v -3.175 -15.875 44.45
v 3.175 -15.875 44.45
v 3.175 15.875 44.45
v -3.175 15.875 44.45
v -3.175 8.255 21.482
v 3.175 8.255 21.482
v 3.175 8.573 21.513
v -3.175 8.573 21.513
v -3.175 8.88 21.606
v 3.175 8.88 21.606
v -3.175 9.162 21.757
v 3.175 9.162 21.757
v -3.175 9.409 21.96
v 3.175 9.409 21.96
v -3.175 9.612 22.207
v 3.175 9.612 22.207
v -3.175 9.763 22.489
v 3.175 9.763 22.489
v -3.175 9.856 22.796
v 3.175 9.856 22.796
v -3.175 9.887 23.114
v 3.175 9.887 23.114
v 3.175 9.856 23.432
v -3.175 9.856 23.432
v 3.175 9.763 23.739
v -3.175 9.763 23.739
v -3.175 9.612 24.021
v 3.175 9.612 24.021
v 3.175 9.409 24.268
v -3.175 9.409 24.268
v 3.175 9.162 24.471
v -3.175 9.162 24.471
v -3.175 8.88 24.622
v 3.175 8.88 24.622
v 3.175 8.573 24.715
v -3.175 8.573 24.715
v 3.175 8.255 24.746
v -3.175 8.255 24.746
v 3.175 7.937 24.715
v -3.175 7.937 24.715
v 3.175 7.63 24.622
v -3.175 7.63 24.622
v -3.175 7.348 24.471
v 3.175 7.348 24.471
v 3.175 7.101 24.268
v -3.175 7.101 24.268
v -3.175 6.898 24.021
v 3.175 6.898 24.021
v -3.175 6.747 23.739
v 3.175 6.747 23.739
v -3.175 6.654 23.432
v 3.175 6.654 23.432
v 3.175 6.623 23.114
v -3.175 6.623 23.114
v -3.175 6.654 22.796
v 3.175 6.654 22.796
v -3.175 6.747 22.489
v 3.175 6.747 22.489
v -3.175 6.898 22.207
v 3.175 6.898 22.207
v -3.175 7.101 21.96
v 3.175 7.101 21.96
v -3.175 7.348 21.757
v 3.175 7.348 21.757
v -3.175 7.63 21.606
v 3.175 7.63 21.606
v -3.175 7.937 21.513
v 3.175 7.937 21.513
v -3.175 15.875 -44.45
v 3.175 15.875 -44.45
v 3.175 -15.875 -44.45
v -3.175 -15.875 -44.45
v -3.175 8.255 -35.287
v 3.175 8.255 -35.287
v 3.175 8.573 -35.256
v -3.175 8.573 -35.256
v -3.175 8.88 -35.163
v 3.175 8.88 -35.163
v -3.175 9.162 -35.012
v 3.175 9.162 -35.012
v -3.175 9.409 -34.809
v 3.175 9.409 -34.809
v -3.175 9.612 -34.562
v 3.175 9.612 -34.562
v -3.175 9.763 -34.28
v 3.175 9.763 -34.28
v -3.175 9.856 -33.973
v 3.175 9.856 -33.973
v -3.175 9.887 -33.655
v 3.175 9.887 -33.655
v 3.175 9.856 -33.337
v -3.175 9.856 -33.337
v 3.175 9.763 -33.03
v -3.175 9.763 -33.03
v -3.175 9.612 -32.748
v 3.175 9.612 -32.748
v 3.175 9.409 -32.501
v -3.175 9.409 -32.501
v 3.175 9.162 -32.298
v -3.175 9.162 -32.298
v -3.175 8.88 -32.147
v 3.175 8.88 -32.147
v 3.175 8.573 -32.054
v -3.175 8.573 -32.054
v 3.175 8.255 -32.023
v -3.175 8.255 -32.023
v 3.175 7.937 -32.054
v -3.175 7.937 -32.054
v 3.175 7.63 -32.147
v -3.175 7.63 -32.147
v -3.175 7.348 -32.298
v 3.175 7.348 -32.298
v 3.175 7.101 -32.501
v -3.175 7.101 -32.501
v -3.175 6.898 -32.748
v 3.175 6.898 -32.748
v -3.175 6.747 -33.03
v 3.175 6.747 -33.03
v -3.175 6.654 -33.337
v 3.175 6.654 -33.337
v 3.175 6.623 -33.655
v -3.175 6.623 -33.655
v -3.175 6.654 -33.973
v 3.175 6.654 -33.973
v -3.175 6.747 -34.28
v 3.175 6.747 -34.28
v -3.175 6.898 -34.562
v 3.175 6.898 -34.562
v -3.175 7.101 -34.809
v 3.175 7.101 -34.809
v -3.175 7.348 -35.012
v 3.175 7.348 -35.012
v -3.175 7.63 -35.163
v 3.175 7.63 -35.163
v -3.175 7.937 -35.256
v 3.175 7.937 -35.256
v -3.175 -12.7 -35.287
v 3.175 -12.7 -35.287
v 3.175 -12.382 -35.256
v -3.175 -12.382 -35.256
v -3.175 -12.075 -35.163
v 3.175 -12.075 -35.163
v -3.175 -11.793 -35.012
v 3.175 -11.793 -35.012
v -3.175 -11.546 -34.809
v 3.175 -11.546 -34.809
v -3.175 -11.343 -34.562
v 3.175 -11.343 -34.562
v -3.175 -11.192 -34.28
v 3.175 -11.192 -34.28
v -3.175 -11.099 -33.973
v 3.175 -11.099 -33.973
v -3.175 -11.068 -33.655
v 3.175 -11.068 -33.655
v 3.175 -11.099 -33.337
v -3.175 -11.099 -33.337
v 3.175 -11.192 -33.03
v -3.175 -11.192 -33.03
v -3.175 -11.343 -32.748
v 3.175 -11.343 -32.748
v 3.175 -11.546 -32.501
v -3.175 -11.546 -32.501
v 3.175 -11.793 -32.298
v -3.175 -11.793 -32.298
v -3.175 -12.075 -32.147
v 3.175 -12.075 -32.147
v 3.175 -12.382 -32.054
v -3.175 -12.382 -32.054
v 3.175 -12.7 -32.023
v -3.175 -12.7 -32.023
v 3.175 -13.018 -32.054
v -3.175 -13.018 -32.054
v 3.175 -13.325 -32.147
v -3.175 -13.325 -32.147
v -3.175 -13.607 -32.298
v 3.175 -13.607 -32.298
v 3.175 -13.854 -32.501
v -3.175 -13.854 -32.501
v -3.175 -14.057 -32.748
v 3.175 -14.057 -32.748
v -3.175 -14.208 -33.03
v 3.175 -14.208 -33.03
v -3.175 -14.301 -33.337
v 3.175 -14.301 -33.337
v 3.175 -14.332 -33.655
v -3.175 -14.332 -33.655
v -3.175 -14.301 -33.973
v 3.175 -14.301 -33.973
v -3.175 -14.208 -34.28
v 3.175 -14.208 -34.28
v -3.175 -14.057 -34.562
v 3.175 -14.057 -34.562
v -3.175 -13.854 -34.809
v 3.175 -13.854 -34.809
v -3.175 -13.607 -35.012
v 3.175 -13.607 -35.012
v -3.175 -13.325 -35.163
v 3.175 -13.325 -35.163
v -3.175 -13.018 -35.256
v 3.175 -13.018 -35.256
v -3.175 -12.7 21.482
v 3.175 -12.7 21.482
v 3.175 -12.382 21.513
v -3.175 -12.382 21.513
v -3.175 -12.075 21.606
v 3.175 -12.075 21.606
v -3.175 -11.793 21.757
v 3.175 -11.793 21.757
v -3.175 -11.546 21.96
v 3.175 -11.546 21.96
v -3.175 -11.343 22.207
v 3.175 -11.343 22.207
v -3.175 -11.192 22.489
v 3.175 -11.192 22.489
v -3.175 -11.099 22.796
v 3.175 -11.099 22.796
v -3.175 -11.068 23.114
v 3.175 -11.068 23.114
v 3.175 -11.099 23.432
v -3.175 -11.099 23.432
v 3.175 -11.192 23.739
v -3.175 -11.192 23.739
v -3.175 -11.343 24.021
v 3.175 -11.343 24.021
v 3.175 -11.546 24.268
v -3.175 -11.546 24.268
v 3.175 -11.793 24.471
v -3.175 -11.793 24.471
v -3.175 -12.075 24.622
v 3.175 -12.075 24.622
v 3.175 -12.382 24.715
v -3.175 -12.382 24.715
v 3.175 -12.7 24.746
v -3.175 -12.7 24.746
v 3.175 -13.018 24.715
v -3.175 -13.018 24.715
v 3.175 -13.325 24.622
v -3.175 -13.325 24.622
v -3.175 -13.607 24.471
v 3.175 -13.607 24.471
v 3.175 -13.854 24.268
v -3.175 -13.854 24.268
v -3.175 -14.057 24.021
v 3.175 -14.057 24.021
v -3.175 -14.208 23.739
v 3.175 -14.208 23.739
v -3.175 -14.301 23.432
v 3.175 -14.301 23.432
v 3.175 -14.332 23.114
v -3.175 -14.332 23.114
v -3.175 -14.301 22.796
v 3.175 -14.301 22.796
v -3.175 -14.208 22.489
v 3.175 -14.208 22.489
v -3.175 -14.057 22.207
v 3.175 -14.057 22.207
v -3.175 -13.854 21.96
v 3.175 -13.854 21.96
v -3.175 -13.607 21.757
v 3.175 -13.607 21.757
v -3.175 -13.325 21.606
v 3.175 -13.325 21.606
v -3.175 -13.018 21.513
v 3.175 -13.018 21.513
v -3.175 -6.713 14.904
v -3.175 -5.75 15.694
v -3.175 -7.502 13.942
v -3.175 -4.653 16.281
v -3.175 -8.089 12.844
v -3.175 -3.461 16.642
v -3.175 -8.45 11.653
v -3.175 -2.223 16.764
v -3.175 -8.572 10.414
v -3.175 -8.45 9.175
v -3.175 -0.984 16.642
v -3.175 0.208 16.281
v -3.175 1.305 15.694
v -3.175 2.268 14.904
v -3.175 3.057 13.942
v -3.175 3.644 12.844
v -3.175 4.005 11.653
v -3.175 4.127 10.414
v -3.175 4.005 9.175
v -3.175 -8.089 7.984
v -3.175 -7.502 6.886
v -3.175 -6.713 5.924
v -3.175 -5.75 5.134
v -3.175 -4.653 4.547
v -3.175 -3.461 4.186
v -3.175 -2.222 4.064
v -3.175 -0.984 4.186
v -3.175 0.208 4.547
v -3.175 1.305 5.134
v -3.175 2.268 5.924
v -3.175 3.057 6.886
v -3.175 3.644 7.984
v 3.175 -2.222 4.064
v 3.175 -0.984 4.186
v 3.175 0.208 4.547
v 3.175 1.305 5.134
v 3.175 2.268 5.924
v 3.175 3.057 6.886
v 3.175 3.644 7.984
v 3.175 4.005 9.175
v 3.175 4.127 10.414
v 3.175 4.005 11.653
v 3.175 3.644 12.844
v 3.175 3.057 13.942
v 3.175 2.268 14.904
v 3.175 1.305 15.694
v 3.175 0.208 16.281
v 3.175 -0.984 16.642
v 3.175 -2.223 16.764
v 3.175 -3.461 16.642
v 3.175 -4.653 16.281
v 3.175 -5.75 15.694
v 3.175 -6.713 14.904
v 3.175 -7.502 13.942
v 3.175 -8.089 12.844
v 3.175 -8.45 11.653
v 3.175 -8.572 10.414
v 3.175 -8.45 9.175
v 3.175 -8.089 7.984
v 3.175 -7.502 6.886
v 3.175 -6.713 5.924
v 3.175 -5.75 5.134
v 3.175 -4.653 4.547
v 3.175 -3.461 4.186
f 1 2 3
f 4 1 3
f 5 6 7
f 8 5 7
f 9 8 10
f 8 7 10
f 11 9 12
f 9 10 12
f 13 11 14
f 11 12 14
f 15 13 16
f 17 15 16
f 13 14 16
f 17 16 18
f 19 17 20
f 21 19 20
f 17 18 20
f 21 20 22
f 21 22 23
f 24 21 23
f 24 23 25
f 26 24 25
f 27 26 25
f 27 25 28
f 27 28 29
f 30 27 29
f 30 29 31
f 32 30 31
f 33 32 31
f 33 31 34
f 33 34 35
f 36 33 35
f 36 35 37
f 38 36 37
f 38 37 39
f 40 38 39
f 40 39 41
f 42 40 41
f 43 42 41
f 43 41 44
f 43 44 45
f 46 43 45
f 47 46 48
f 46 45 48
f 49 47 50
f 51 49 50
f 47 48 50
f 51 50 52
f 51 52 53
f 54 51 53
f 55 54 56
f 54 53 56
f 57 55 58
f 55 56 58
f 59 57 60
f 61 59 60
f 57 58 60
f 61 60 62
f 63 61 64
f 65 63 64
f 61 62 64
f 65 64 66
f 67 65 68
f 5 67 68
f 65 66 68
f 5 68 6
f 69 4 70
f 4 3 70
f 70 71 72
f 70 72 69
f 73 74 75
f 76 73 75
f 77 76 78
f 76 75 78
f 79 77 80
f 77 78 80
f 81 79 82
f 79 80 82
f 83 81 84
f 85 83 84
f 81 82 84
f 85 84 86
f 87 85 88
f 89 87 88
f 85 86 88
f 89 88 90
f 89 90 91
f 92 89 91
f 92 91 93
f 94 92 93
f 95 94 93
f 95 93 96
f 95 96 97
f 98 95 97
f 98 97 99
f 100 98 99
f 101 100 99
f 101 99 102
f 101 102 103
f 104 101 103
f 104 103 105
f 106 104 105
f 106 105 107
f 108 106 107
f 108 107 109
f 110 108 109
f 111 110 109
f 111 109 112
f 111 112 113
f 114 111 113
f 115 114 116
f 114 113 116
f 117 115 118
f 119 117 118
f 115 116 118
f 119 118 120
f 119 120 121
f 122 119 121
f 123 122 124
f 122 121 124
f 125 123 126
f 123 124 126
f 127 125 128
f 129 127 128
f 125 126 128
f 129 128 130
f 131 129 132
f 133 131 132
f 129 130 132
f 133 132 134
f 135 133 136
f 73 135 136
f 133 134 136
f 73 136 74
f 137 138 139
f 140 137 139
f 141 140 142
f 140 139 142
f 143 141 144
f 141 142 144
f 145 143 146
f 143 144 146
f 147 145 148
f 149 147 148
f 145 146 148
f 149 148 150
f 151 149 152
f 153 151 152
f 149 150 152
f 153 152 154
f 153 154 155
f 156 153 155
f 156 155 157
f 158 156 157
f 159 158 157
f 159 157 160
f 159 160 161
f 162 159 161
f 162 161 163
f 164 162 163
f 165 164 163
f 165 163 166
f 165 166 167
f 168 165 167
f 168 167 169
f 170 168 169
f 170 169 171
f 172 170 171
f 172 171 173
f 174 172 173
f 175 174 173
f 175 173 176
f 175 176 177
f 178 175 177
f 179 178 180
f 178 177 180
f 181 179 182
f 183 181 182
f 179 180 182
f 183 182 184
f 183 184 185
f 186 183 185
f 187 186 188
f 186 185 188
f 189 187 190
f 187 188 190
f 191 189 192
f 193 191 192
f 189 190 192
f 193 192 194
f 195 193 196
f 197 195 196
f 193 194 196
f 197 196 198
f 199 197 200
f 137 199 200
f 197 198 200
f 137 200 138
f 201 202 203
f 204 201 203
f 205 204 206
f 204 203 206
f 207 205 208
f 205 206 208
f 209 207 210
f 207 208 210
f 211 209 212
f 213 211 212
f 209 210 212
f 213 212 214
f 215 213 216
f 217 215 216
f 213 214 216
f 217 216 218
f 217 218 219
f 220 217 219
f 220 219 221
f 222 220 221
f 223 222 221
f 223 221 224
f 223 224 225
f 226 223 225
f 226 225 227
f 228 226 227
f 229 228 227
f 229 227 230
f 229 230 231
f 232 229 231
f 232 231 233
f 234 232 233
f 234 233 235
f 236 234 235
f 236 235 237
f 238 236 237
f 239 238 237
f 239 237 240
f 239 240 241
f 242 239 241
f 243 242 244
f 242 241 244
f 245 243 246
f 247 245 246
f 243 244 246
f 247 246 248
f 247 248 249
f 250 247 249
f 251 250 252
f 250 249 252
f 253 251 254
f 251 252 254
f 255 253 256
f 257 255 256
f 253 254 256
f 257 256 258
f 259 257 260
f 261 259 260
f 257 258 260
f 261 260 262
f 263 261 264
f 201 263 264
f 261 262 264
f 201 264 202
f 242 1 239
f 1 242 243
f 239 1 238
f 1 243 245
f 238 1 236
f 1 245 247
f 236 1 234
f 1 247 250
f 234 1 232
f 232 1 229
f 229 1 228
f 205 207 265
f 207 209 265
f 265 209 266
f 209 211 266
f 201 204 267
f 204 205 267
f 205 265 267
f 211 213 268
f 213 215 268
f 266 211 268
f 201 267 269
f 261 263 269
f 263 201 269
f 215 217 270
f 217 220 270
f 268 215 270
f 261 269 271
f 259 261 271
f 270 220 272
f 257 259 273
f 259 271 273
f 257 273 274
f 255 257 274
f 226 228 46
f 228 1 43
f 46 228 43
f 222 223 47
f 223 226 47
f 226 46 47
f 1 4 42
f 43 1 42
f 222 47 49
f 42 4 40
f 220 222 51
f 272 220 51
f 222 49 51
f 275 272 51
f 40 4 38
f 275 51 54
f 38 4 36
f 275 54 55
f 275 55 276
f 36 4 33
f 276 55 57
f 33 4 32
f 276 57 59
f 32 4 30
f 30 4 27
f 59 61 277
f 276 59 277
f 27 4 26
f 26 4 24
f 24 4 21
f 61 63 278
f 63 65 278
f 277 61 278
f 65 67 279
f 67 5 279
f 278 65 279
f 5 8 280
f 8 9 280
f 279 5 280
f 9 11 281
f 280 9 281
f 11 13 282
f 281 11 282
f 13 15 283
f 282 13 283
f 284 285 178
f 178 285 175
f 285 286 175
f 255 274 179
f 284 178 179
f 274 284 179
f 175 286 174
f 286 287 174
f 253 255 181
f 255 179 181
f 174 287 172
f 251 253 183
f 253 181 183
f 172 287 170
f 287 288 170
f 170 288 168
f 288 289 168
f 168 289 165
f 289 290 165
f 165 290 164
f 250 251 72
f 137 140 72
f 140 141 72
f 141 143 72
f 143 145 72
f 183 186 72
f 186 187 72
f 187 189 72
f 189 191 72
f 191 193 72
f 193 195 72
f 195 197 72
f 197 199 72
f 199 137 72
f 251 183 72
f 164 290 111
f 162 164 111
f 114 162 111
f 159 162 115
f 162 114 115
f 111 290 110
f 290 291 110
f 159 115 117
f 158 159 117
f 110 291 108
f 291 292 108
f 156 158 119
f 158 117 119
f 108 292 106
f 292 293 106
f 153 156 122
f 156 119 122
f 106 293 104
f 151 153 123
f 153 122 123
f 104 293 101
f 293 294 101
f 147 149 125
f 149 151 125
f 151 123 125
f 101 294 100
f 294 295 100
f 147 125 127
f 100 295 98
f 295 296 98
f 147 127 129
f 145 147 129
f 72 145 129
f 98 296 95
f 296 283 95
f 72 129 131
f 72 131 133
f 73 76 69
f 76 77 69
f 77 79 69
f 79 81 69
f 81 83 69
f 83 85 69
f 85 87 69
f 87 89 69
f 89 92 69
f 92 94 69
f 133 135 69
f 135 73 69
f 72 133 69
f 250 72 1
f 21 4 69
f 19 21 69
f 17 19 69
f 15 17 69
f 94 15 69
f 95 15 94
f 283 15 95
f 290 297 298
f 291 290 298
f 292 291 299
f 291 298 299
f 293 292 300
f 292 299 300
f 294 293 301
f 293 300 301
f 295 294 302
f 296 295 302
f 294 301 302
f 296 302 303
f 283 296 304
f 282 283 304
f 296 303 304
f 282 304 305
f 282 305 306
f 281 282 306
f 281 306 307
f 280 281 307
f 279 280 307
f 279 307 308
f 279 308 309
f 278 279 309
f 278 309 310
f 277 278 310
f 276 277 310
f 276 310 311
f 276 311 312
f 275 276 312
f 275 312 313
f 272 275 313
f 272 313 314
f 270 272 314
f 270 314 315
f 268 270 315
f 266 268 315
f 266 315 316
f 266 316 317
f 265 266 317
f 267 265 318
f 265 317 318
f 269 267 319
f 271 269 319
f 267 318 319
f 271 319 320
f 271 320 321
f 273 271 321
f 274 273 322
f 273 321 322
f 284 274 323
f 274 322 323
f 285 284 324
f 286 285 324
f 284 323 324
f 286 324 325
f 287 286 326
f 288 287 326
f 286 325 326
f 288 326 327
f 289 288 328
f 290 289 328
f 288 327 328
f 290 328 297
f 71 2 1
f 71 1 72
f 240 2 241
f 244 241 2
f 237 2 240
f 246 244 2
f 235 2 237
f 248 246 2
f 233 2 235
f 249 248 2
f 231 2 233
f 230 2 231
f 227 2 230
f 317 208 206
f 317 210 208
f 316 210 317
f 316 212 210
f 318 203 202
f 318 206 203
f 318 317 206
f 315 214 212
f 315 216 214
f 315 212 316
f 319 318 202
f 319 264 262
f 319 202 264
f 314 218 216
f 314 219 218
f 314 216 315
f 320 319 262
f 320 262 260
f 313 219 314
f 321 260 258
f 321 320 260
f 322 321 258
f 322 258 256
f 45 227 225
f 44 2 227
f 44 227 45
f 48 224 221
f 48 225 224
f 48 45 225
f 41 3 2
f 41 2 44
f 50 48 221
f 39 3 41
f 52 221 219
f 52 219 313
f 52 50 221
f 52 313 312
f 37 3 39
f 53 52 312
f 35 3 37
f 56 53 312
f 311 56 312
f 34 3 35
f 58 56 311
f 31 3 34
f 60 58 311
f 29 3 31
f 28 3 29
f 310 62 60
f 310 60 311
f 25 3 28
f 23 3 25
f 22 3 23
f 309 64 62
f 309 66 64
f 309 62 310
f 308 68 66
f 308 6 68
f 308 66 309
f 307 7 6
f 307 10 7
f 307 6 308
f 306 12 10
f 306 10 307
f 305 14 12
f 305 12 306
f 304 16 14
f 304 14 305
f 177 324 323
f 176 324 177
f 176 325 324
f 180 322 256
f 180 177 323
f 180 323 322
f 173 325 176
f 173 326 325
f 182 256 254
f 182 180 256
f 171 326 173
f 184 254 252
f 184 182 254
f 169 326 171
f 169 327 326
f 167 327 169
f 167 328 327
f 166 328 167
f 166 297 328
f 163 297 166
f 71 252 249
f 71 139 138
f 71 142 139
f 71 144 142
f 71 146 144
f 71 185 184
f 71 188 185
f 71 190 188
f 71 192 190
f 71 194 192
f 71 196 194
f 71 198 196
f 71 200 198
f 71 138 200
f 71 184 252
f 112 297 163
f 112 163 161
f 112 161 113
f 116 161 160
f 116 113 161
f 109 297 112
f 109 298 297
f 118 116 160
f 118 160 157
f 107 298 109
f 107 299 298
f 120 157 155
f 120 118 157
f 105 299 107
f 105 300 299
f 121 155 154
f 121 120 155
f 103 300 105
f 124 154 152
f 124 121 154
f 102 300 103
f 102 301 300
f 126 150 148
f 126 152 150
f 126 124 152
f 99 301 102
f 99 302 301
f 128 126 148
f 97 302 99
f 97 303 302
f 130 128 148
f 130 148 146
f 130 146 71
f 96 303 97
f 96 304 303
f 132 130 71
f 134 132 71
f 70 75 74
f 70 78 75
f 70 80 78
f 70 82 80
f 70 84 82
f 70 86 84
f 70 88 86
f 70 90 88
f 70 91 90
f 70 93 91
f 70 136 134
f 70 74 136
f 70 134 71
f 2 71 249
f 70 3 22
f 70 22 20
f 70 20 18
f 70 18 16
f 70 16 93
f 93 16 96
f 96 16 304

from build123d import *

# Parameters (mm, degrees)
SKETCH1_W           = 88.9
SKETCH1_H           = 31.75
BOSS_EXTRUDE1_DEPTH = 3.175
CUT_EXTRUDE1_REACH  = 49.625
SKETCH2_R           = 1.63195
SKETCH2_R_2         = 6.35


with BuildPart() as part:
    # Sketch1 → Boss-Extrude1 (new, symmetric)
    with BuildSketch(Plane(origin=(0, 0, 0), x_dir=(0, 0, -1), z_dir=(1, 0, 0))):
        Rectangle(SKETCH1_W, SKETCH1_H)
    extrude(amount=BOSS_EXTRUDE1_DEPTH, both=True)

    # Sketch2 → Cut-Extrude1 (cut, up to next)
    with BuildSketch(Plane(origin=(3.175, 0, 0), x_dir=(0, 0, -1), z_dir=(1, 0, 0)), mode=Mode.PRIVATE) as cut_extrude1_sk1:
        with Locations((-23.114, 8.255)):
            Circle(SKETCH2_R)
    cut_extrude1_tool1 = extrude(cut_extrude1_sk1.sketch, amount=-CUT_EXTRUDE1_REACH, mode=Mode.PRIVATE) & part.part
    # Sketch2 → Cut-Extrude1 (cut, up to next)
    with BuildSketch(Plane(origin=(3.175, 0, 0), x_dir=(0, 0, -1), z_dir=(1, 0, 0)), mode=Mode.PRIVATE) as cut_extrude1_sk2:
        with Locations((-23.114, -12.7)):
            Circle(SKETCH2_R)
    cut_extrude1_tool2 = extrude(cut_extrude1_sk2.sketch, amount=-CUT_EXTRUDE1_REACH, mode=Mode.PRIVATE) & part.part
    # Sketch2 → Cut-Extrude1 (cut, up to next)
    with BuildSketch(Plane(origin=(3.175, 0, 0), x_dir=(0, 0, -1), z_dir=(1, 0, 0)), mode=Mode.PRIVATE) as cut_extrude1_sk3:
        with Locations((33.655, -12.7)):
            Circle(SKETCH2_R)
    cut_extrude1_tool3 = extrude(cut_extrude1_sk3.sketch, amount=-CUT_EXTRUDE1_REACH, mode=Mode.PRIVATE) & part.part
    # Sketch2 → Cut-Extrude1 (cut, up to next)
    with BuildSketch(Plane(origin=(3.175, 0, 0), x_dir=(0, 0, -1), z_dir=(1, 0, 0)), mode=Mode.PRIVATE) as cut_extrude1_sk4:
        with Locations((33.655, 8.255)):
            Circle(SKETCH2_R)
    cut_extrude1_tool4 = extrude(cut_extrude1_sk4.sketch, amount=-CUT_EXTRUDE1_REACH, mode=Mode.PRIVATE) & part.part
    # Sketch2 → Cut-Extrude1 (cut, up to next)
    with BuildSketch(Plane(origin=(3.175, 0, 0), x_dir=(0, 0, -1), z_dir=(1, 0, 0)), mode=Mode.PRIVATE) as cut_extrude1_sk5:
        with Locations((-10.414, -2.2225)):
            Circle(SKETCH2_R_2)
    cut_extrude1_tool5 = extrude(cut_extrude1_sk5.sketch, amount=-CUT_EXTRUDE1_REACH, mode=Mode.PRIVATE) & part.part
    add(cut_extrude1_tool1.solids().sort_by_distance((3.175, 8.255, 23.114))[0], mode=Mode.SUBTRACT)
    add(cut_extrude1_tool2.solids().sort_by_distance((3.175, -12.7, 23.114))[0], mode=Mode.SUBTRACT)
    add(cut_extrude1_tool3.solids().sort_by_distance((3.175, -12.7, -33.655))[0], mode=Mode.SUBTRACT)
    add(cut_extrude1_tool4.solids().sort_by_distance((3.175, 8.255, -33.655))[0], mode=Mode.SUBTRACT)
    add(cut_extrude1_tool5.solids().sort_by_distance((3.175, -2.2225, 10.414))[0], mode=Mode.SUBTRACT)


solid = part.part
